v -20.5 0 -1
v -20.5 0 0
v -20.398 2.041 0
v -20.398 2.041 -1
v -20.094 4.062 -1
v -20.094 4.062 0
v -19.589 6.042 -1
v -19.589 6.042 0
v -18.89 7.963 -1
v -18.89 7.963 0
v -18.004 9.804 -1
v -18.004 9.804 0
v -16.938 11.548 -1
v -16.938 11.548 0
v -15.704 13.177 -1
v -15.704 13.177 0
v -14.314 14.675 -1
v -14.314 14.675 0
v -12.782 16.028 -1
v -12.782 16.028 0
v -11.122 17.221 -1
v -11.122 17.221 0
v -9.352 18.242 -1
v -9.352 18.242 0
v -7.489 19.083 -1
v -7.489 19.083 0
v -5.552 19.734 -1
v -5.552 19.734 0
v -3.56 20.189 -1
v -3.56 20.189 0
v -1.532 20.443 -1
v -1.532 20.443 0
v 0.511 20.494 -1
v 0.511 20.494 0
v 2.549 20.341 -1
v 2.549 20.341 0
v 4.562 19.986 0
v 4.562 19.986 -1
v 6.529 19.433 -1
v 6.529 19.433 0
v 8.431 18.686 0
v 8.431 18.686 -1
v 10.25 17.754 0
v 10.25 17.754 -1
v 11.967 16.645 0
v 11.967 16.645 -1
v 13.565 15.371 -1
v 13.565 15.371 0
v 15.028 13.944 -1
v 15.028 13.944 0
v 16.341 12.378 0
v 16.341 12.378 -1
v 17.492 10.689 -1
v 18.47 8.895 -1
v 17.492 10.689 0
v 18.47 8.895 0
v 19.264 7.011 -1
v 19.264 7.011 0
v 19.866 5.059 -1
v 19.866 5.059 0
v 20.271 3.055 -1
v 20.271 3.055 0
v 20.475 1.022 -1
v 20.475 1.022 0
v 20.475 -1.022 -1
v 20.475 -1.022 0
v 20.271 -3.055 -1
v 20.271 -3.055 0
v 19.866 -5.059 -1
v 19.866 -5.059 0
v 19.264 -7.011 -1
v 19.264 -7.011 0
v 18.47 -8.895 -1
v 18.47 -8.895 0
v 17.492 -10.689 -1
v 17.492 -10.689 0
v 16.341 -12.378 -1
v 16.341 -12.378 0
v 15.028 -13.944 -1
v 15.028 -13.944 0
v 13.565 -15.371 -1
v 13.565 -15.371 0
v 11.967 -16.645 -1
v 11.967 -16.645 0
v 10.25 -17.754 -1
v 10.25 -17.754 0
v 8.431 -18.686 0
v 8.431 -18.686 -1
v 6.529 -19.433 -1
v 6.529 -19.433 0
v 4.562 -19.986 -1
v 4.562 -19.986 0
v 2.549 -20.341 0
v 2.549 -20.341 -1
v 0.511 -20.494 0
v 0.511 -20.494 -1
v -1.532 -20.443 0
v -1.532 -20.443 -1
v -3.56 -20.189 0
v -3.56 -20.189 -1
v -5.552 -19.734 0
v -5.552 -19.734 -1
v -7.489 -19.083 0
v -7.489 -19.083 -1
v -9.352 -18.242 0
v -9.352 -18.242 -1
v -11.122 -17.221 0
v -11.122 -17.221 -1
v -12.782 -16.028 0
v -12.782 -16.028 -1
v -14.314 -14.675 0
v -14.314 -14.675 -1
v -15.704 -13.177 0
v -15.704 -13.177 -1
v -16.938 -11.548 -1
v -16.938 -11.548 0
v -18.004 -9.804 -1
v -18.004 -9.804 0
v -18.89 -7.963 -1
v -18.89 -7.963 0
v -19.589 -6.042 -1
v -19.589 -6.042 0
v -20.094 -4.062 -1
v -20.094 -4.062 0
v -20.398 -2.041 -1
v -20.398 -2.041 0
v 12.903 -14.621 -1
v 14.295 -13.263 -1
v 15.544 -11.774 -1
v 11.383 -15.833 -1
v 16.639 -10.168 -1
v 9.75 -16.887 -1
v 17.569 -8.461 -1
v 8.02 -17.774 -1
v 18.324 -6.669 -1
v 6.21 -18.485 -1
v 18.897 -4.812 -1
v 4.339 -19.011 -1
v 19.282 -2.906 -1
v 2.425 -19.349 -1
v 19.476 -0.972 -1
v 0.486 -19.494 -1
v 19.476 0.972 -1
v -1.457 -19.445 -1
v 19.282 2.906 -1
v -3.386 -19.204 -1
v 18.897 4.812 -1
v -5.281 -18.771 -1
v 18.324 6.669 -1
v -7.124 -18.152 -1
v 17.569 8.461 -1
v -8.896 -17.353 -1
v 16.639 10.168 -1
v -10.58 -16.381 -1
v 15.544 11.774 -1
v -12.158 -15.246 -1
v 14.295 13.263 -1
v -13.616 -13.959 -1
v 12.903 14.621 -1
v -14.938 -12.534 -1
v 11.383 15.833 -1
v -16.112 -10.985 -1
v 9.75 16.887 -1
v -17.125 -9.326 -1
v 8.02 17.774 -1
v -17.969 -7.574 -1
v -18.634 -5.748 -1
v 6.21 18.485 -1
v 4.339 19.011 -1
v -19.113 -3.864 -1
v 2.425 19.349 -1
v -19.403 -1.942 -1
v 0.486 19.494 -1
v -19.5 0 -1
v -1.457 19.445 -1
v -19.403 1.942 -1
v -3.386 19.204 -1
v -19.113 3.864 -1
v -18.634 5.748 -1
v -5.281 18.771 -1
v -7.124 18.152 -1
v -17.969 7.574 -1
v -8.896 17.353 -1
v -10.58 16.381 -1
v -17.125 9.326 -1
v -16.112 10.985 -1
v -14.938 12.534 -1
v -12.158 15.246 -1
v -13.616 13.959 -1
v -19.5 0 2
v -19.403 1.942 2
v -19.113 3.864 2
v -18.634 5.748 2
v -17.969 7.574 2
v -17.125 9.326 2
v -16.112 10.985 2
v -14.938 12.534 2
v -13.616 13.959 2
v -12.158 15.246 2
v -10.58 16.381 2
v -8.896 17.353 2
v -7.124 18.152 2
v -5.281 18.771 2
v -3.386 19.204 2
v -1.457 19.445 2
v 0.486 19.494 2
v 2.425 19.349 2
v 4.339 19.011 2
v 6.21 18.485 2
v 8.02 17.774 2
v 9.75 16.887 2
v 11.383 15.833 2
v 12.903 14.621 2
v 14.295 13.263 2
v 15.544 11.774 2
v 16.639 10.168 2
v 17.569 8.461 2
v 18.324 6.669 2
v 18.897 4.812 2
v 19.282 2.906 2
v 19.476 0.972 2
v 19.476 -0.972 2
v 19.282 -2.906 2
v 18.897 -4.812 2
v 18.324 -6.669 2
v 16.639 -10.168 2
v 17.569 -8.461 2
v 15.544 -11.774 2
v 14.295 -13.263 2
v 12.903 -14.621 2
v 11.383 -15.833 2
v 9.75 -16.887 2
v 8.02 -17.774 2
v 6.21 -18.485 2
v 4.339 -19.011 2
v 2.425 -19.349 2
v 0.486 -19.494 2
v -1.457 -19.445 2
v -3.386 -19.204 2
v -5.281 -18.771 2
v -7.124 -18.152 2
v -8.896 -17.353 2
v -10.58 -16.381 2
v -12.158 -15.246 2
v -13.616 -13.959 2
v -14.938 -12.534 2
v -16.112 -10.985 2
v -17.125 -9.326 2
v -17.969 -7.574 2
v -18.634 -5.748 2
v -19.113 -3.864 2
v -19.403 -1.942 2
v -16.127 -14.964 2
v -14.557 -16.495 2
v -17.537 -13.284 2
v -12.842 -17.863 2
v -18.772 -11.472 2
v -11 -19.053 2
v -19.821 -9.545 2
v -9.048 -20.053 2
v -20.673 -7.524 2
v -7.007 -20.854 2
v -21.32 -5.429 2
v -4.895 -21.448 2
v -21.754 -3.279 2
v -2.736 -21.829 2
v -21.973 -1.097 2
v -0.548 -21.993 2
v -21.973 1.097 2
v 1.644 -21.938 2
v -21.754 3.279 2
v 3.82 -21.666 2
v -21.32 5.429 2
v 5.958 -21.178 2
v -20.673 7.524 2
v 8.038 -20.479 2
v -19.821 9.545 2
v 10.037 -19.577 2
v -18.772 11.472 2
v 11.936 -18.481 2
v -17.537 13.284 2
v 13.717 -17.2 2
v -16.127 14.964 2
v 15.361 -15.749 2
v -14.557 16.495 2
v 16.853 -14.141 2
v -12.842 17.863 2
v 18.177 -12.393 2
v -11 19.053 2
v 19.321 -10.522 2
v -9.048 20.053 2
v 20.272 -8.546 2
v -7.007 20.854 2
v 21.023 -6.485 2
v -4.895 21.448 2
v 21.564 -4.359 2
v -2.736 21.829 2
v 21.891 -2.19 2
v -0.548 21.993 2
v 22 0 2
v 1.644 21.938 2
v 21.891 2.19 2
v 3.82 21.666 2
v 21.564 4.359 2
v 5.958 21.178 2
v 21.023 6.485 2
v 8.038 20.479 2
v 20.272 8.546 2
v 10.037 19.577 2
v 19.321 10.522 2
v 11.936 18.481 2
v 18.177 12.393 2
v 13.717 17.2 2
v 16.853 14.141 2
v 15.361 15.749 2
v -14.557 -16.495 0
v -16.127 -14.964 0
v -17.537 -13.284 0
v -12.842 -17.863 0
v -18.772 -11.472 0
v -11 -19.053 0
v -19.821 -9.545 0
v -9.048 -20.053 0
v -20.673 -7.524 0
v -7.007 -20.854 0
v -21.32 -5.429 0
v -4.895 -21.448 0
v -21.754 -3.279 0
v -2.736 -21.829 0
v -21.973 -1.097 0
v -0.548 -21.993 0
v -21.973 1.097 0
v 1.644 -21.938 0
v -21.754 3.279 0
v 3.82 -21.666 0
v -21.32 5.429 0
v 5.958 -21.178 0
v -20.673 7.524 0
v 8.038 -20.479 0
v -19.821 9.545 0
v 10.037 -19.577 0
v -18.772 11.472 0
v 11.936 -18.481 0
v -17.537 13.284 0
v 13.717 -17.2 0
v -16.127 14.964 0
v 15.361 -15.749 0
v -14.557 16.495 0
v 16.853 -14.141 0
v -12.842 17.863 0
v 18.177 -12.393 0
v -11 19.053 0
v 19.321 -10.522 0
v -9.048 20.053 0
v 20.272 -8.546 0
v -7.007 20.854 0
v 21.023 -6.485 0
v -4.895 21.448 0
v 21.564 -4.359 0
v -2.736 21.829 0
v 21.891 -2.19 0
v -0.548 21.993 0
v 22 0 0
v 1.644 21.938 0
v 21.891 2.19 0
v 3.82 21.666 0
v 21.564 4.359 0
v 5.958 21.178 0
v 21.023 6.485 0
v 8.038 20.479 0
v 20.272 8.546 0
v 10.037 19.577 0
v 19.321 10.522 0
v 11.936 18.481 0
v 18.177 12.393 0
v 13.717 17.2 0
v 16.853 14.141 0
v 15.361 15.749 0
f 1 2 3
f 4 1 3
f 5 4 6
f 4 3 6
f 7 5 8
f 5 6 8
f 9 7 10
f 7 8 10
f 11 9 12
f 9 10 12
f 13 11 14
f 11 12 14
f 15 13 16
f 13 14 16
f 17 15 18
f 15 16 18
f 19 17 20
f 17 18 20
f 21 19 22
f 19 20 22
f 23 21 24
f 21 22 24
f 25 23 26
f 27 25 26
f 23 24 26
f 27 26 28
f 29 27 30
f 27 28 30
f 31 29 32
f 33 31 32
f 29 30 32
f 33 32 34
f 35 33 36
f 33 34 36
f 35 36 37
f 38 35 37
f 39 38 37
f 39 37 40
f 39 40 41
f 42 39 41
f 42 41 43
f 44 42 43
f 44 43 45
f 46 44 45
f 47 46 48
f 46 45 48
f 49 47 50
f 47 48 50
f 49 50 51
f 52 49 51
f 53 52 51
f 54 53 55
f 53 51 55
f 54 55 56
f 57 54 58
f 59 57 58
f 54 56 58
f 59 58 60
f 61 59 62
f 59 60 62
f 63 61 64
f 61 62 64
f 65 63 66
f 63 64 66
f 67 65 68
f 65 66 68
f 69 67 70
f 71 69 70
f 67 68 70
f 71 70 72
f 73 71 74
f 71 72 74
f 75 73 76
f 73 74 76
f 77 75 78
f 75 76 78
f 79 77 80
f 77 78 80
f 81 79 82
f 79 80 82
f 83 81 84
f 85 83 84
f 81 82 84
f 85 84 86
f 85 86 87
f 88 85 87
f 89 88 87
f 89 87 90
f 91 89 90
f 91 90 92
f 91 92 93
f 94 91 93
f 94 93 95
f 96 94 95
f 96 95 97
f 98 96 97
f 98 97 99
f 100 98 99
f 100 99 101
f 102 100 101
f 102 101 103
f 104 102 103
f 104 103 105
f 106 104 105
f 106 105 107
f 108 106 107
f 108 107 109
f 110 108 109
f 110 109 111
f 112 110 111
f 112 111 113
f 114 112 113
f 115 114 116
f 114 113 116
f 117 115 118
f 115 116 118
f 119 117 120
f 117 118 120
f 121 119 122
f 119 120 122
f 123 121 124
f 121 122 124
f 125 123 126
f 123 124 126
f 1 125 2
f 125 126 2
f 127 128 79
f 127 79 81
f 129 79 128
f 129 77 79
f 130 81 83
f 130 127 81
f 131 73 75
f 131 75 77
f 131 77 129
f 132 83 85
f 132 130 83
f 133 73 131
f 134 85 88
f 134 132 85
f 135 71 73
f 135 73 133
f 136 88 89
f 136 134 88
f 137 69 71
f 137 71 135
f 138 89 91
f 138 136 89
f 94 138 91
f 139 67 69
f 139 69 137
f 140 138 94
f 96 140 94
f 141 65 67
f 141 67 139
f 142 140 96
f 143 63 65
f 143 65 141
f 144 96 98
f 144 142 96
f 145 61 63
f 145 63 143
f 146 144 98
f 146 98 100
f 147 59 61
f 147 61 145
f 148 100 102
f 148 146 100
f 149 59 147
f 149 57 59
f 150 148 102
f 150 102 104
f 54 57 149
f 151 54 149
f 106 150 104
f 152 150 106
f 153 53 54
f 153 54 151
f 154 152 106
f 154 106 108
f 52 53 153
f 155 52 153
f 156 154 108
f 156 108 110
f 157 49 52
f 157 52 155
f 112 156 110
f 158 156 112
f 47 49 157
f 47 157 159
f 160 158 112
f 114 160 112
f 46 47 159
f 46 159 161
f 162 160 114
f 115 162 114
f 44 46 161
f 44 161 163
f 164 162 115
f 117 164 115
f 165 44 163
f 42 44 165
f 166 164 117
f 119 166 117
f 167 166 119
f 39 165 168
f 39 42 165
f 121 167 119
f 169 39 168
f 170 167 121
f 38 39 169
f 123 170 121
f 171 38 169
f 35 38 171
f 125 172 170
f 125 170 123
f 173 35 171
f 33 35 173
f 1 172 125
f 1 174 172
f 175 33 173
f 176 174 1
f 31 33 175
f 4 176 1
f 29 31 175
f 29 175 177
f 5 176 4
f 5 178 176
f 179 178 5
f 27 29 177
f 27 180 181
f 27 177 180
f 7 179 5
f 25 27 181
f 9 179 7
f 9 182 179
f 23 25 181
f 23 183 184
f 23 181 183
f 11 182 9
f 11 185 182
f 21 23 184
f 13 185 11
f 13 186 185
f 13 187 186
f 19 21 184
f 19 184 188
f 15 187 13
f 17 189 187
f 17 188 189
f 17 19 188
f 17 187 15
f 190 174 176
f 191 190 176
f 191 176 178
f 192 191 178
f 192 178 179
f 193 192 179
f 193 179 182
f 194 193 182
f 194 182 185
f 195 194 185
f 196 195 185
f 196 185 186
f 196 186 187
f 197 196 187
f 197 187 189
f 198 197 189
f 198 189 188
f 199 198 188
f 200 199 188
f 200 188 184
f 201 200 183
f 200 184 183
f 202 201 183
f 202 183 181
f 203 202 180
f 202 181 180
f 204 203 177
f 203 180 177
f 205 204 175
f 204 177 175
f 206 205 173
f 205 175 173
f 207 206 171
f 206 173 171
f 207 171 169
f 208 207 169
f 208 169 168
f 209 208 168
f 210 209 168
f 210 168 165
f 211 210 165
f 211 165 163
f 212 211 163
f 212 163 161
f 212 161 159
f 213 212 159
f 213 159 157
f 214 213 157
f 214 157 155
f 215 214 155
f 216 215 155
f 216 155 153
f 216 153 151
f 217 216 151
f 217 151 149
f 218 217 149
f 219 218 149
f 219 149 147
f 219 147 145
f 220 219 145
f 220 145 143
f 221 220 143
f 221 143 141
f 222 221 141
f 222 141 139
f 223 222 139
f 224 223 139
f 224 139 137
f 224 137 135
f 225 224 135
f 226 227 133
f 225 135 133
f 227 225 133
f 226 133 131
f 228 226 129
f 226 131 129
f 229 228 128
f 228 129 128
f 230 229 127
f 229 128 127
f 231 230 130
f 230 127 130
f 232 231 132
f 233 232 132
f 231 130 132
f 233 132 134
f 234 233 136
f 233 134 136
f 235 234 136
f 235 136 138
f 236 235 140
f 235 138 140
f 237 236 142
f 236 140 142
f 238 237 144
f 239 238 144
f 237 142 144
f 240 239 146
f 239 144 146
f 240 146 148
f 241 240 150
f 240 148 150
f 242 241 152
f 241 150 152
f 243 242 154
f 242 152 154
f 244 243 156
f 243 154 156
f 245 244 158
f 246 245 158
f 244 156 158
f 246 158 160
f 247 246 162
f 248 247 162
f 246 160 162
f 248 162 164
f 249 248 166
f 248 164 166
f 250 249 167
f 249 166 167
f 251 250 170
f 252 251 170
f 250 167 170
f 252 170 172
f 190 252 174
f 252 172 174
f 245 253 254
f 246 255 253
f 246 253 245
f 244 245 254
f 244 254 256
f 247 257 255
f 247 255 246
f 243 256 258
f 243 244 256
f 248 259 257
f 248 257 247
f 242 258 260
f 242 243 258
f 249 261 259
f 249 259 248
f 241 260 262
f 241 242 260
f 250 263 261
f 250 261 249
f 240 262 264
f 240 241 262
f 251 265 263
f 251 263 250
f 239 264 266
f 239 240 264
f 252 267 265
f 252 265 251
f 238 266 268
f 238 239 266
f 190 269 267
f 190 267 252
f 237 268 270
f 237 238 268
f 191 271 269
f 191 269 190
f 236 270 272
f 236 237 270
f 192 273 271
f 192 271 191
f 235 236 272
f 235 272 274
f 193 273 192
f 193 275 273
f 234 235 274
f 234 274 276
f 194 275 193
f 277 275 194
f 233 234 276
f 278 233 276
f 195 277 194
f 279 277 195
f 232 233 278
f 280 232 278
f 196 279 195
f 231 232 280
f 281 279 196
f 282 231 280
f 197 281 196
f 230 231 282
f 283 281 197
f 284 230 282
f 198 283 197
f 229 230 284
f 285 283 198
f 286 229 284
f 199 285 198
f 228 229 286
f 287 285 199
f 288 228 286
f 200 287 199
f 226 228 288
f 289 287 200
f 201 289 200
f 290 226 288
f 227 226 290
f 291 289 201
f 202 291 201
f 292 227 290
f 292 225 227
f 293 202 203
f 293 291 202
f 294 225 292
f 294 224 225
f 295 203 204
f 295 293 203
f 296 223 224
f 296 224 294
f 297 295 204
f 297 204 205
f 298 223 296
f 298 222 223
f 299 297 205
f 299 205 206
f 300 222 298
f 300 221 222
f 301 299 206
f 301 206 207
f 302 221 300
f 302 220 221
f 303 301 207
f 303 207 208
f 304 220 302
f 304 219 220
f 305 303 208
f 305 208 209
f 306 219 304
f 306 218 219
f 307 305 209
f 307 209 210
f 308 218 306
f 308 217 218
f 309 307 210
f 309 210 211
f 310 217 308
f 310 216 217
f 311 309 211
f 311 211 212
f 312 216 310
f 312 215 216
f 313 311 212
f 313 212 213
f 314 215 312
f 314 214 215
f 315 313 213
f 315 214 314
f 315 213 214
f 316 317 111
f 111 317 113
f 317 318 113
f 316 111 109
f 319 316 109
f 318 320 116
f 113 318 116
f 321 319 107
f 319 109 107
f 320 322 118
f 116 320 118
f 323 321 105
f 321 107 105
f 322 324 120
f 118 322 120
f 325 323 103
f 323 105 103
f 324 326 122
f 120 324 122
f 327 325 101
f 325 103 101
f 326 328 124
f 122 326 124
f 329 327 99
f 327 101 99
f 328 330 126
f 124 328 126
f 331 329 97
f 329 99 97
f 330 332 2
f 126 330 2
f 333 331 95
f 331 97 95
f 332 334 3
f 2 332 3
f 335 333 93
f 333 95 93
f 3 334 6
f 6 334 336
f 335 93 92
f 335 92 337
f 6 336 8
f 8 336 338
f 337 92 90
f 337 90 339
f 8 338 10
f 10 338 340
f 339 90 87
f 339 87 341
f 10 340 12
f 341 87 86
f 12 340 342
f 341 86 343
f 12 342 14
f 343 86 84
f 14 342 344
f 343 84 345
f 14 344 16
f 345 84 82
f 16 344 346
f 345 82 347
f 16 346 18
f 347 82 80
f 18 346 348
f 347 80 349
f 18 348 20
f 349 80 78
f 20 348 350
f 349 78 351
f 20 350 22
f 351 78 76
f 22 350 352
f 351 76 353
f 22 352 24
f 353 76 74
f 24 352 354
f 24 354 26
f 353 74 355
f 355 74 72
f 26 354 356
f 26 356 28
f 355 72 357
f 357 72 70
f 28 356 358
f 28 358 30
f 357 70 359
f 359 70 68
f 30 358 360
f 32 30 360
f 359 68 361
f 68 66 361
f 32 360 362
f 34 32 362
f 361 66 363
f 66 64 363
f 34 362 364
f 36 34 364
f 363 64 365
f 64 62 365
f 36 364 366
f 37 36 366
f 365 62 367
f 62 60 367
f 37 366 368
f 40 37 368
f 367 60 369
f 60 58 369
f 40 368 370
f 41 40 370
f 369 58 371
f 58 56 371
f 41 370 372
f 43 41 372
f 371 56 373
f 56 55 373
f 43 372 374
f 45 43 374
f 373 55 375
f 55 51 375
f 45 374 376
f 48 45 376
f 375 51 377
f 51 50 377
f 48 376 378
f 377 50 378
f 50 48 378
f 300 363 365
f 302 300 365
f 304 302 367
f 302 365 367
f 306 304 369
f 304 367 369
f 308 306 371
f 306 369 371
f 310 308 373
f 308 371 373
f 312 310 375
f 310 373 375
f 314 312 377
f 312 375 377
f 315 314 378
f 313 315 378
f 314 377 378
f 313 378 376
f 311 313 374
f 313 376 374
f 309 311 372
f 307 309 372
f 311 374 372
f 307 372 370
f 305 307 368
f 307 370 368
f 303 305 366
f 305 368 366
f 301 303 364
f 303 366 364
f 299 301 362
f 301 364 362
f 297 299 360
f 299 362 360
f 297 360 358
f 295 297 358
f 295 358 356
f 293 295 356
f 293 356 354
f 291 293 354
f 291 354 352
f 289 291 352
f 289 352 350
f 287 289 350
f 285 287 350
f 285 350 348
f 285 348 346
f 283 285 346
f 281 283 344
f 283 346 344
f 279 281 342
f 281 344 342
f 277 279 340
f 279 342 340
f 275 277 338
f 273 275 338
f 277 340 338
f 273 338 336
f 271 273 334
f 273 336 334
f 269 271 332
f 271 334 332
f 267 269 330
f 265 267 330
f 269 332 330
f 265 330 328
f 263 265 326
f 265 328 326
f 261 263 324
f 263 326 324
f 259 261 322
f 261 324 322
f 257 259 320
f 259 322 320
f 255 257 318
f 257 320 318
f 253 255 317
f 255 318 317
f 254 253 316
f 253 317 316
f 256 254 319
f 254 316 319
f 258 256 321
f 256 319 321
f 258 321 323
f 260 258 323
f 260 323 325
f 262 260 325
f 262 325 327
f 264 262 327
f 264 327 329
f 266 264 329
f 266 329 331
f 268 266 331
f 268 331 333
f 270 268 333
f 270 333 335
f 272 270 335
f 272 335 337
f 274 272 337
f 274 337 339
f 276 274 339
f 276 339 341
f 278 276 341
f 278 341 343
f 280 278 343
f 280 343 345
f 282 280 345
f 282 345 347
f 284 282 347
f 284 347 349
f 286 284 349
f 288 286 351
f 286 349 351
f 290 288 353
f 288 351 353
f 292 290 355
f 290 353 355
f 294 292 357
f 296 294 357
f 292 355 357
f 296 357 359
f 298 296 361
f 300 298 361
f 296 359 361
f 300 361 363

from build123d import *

# Parameters (mm, degrees)
SKETCH1_R           = 22
BOSS_EXTRUDE2_DEPTH = 2
SKETCH4_R           = 20.5
BOSS_EXTRUDE3_DEPTH = 1
SKETCH5_R           = 19.5
CUT_EXTRUDE1_DEPTH  = 32.256999216


with BuildPart() as part:
    # Sketch1 → Boss-Extrude2 (new body)
    with BuildSketch(Plane.XY):
        Circle(SKETCH1_R)
    extrude(amount=BOSS_EXTRUDE2_DEPTH)

    # Sketch4 → Boss-Extrude3 (add)
    with BuildSketch(Plane(origin=(0, 0, 0), x_dir=(-1, 0, 0), z_dir=(0, 0, -1))):
        Circle(SKETCH4_R)
    extrude(amount=BOSS_EXTRUDE3_DEPTH)

    # Sketch5 → Cut-Extrude1 (cut, through all)
    with BuildSketch(Plane(origin=(0, 0, -1), x_dir=(-1, 0, 0), z_dir=(0, 0, -1))):
        Circle(SKETCH5_R)
    extrude(amount=-CUT_EXTRUDE1_DEPTH, mode=Mode.SUBTRACT)


solid = part.part
